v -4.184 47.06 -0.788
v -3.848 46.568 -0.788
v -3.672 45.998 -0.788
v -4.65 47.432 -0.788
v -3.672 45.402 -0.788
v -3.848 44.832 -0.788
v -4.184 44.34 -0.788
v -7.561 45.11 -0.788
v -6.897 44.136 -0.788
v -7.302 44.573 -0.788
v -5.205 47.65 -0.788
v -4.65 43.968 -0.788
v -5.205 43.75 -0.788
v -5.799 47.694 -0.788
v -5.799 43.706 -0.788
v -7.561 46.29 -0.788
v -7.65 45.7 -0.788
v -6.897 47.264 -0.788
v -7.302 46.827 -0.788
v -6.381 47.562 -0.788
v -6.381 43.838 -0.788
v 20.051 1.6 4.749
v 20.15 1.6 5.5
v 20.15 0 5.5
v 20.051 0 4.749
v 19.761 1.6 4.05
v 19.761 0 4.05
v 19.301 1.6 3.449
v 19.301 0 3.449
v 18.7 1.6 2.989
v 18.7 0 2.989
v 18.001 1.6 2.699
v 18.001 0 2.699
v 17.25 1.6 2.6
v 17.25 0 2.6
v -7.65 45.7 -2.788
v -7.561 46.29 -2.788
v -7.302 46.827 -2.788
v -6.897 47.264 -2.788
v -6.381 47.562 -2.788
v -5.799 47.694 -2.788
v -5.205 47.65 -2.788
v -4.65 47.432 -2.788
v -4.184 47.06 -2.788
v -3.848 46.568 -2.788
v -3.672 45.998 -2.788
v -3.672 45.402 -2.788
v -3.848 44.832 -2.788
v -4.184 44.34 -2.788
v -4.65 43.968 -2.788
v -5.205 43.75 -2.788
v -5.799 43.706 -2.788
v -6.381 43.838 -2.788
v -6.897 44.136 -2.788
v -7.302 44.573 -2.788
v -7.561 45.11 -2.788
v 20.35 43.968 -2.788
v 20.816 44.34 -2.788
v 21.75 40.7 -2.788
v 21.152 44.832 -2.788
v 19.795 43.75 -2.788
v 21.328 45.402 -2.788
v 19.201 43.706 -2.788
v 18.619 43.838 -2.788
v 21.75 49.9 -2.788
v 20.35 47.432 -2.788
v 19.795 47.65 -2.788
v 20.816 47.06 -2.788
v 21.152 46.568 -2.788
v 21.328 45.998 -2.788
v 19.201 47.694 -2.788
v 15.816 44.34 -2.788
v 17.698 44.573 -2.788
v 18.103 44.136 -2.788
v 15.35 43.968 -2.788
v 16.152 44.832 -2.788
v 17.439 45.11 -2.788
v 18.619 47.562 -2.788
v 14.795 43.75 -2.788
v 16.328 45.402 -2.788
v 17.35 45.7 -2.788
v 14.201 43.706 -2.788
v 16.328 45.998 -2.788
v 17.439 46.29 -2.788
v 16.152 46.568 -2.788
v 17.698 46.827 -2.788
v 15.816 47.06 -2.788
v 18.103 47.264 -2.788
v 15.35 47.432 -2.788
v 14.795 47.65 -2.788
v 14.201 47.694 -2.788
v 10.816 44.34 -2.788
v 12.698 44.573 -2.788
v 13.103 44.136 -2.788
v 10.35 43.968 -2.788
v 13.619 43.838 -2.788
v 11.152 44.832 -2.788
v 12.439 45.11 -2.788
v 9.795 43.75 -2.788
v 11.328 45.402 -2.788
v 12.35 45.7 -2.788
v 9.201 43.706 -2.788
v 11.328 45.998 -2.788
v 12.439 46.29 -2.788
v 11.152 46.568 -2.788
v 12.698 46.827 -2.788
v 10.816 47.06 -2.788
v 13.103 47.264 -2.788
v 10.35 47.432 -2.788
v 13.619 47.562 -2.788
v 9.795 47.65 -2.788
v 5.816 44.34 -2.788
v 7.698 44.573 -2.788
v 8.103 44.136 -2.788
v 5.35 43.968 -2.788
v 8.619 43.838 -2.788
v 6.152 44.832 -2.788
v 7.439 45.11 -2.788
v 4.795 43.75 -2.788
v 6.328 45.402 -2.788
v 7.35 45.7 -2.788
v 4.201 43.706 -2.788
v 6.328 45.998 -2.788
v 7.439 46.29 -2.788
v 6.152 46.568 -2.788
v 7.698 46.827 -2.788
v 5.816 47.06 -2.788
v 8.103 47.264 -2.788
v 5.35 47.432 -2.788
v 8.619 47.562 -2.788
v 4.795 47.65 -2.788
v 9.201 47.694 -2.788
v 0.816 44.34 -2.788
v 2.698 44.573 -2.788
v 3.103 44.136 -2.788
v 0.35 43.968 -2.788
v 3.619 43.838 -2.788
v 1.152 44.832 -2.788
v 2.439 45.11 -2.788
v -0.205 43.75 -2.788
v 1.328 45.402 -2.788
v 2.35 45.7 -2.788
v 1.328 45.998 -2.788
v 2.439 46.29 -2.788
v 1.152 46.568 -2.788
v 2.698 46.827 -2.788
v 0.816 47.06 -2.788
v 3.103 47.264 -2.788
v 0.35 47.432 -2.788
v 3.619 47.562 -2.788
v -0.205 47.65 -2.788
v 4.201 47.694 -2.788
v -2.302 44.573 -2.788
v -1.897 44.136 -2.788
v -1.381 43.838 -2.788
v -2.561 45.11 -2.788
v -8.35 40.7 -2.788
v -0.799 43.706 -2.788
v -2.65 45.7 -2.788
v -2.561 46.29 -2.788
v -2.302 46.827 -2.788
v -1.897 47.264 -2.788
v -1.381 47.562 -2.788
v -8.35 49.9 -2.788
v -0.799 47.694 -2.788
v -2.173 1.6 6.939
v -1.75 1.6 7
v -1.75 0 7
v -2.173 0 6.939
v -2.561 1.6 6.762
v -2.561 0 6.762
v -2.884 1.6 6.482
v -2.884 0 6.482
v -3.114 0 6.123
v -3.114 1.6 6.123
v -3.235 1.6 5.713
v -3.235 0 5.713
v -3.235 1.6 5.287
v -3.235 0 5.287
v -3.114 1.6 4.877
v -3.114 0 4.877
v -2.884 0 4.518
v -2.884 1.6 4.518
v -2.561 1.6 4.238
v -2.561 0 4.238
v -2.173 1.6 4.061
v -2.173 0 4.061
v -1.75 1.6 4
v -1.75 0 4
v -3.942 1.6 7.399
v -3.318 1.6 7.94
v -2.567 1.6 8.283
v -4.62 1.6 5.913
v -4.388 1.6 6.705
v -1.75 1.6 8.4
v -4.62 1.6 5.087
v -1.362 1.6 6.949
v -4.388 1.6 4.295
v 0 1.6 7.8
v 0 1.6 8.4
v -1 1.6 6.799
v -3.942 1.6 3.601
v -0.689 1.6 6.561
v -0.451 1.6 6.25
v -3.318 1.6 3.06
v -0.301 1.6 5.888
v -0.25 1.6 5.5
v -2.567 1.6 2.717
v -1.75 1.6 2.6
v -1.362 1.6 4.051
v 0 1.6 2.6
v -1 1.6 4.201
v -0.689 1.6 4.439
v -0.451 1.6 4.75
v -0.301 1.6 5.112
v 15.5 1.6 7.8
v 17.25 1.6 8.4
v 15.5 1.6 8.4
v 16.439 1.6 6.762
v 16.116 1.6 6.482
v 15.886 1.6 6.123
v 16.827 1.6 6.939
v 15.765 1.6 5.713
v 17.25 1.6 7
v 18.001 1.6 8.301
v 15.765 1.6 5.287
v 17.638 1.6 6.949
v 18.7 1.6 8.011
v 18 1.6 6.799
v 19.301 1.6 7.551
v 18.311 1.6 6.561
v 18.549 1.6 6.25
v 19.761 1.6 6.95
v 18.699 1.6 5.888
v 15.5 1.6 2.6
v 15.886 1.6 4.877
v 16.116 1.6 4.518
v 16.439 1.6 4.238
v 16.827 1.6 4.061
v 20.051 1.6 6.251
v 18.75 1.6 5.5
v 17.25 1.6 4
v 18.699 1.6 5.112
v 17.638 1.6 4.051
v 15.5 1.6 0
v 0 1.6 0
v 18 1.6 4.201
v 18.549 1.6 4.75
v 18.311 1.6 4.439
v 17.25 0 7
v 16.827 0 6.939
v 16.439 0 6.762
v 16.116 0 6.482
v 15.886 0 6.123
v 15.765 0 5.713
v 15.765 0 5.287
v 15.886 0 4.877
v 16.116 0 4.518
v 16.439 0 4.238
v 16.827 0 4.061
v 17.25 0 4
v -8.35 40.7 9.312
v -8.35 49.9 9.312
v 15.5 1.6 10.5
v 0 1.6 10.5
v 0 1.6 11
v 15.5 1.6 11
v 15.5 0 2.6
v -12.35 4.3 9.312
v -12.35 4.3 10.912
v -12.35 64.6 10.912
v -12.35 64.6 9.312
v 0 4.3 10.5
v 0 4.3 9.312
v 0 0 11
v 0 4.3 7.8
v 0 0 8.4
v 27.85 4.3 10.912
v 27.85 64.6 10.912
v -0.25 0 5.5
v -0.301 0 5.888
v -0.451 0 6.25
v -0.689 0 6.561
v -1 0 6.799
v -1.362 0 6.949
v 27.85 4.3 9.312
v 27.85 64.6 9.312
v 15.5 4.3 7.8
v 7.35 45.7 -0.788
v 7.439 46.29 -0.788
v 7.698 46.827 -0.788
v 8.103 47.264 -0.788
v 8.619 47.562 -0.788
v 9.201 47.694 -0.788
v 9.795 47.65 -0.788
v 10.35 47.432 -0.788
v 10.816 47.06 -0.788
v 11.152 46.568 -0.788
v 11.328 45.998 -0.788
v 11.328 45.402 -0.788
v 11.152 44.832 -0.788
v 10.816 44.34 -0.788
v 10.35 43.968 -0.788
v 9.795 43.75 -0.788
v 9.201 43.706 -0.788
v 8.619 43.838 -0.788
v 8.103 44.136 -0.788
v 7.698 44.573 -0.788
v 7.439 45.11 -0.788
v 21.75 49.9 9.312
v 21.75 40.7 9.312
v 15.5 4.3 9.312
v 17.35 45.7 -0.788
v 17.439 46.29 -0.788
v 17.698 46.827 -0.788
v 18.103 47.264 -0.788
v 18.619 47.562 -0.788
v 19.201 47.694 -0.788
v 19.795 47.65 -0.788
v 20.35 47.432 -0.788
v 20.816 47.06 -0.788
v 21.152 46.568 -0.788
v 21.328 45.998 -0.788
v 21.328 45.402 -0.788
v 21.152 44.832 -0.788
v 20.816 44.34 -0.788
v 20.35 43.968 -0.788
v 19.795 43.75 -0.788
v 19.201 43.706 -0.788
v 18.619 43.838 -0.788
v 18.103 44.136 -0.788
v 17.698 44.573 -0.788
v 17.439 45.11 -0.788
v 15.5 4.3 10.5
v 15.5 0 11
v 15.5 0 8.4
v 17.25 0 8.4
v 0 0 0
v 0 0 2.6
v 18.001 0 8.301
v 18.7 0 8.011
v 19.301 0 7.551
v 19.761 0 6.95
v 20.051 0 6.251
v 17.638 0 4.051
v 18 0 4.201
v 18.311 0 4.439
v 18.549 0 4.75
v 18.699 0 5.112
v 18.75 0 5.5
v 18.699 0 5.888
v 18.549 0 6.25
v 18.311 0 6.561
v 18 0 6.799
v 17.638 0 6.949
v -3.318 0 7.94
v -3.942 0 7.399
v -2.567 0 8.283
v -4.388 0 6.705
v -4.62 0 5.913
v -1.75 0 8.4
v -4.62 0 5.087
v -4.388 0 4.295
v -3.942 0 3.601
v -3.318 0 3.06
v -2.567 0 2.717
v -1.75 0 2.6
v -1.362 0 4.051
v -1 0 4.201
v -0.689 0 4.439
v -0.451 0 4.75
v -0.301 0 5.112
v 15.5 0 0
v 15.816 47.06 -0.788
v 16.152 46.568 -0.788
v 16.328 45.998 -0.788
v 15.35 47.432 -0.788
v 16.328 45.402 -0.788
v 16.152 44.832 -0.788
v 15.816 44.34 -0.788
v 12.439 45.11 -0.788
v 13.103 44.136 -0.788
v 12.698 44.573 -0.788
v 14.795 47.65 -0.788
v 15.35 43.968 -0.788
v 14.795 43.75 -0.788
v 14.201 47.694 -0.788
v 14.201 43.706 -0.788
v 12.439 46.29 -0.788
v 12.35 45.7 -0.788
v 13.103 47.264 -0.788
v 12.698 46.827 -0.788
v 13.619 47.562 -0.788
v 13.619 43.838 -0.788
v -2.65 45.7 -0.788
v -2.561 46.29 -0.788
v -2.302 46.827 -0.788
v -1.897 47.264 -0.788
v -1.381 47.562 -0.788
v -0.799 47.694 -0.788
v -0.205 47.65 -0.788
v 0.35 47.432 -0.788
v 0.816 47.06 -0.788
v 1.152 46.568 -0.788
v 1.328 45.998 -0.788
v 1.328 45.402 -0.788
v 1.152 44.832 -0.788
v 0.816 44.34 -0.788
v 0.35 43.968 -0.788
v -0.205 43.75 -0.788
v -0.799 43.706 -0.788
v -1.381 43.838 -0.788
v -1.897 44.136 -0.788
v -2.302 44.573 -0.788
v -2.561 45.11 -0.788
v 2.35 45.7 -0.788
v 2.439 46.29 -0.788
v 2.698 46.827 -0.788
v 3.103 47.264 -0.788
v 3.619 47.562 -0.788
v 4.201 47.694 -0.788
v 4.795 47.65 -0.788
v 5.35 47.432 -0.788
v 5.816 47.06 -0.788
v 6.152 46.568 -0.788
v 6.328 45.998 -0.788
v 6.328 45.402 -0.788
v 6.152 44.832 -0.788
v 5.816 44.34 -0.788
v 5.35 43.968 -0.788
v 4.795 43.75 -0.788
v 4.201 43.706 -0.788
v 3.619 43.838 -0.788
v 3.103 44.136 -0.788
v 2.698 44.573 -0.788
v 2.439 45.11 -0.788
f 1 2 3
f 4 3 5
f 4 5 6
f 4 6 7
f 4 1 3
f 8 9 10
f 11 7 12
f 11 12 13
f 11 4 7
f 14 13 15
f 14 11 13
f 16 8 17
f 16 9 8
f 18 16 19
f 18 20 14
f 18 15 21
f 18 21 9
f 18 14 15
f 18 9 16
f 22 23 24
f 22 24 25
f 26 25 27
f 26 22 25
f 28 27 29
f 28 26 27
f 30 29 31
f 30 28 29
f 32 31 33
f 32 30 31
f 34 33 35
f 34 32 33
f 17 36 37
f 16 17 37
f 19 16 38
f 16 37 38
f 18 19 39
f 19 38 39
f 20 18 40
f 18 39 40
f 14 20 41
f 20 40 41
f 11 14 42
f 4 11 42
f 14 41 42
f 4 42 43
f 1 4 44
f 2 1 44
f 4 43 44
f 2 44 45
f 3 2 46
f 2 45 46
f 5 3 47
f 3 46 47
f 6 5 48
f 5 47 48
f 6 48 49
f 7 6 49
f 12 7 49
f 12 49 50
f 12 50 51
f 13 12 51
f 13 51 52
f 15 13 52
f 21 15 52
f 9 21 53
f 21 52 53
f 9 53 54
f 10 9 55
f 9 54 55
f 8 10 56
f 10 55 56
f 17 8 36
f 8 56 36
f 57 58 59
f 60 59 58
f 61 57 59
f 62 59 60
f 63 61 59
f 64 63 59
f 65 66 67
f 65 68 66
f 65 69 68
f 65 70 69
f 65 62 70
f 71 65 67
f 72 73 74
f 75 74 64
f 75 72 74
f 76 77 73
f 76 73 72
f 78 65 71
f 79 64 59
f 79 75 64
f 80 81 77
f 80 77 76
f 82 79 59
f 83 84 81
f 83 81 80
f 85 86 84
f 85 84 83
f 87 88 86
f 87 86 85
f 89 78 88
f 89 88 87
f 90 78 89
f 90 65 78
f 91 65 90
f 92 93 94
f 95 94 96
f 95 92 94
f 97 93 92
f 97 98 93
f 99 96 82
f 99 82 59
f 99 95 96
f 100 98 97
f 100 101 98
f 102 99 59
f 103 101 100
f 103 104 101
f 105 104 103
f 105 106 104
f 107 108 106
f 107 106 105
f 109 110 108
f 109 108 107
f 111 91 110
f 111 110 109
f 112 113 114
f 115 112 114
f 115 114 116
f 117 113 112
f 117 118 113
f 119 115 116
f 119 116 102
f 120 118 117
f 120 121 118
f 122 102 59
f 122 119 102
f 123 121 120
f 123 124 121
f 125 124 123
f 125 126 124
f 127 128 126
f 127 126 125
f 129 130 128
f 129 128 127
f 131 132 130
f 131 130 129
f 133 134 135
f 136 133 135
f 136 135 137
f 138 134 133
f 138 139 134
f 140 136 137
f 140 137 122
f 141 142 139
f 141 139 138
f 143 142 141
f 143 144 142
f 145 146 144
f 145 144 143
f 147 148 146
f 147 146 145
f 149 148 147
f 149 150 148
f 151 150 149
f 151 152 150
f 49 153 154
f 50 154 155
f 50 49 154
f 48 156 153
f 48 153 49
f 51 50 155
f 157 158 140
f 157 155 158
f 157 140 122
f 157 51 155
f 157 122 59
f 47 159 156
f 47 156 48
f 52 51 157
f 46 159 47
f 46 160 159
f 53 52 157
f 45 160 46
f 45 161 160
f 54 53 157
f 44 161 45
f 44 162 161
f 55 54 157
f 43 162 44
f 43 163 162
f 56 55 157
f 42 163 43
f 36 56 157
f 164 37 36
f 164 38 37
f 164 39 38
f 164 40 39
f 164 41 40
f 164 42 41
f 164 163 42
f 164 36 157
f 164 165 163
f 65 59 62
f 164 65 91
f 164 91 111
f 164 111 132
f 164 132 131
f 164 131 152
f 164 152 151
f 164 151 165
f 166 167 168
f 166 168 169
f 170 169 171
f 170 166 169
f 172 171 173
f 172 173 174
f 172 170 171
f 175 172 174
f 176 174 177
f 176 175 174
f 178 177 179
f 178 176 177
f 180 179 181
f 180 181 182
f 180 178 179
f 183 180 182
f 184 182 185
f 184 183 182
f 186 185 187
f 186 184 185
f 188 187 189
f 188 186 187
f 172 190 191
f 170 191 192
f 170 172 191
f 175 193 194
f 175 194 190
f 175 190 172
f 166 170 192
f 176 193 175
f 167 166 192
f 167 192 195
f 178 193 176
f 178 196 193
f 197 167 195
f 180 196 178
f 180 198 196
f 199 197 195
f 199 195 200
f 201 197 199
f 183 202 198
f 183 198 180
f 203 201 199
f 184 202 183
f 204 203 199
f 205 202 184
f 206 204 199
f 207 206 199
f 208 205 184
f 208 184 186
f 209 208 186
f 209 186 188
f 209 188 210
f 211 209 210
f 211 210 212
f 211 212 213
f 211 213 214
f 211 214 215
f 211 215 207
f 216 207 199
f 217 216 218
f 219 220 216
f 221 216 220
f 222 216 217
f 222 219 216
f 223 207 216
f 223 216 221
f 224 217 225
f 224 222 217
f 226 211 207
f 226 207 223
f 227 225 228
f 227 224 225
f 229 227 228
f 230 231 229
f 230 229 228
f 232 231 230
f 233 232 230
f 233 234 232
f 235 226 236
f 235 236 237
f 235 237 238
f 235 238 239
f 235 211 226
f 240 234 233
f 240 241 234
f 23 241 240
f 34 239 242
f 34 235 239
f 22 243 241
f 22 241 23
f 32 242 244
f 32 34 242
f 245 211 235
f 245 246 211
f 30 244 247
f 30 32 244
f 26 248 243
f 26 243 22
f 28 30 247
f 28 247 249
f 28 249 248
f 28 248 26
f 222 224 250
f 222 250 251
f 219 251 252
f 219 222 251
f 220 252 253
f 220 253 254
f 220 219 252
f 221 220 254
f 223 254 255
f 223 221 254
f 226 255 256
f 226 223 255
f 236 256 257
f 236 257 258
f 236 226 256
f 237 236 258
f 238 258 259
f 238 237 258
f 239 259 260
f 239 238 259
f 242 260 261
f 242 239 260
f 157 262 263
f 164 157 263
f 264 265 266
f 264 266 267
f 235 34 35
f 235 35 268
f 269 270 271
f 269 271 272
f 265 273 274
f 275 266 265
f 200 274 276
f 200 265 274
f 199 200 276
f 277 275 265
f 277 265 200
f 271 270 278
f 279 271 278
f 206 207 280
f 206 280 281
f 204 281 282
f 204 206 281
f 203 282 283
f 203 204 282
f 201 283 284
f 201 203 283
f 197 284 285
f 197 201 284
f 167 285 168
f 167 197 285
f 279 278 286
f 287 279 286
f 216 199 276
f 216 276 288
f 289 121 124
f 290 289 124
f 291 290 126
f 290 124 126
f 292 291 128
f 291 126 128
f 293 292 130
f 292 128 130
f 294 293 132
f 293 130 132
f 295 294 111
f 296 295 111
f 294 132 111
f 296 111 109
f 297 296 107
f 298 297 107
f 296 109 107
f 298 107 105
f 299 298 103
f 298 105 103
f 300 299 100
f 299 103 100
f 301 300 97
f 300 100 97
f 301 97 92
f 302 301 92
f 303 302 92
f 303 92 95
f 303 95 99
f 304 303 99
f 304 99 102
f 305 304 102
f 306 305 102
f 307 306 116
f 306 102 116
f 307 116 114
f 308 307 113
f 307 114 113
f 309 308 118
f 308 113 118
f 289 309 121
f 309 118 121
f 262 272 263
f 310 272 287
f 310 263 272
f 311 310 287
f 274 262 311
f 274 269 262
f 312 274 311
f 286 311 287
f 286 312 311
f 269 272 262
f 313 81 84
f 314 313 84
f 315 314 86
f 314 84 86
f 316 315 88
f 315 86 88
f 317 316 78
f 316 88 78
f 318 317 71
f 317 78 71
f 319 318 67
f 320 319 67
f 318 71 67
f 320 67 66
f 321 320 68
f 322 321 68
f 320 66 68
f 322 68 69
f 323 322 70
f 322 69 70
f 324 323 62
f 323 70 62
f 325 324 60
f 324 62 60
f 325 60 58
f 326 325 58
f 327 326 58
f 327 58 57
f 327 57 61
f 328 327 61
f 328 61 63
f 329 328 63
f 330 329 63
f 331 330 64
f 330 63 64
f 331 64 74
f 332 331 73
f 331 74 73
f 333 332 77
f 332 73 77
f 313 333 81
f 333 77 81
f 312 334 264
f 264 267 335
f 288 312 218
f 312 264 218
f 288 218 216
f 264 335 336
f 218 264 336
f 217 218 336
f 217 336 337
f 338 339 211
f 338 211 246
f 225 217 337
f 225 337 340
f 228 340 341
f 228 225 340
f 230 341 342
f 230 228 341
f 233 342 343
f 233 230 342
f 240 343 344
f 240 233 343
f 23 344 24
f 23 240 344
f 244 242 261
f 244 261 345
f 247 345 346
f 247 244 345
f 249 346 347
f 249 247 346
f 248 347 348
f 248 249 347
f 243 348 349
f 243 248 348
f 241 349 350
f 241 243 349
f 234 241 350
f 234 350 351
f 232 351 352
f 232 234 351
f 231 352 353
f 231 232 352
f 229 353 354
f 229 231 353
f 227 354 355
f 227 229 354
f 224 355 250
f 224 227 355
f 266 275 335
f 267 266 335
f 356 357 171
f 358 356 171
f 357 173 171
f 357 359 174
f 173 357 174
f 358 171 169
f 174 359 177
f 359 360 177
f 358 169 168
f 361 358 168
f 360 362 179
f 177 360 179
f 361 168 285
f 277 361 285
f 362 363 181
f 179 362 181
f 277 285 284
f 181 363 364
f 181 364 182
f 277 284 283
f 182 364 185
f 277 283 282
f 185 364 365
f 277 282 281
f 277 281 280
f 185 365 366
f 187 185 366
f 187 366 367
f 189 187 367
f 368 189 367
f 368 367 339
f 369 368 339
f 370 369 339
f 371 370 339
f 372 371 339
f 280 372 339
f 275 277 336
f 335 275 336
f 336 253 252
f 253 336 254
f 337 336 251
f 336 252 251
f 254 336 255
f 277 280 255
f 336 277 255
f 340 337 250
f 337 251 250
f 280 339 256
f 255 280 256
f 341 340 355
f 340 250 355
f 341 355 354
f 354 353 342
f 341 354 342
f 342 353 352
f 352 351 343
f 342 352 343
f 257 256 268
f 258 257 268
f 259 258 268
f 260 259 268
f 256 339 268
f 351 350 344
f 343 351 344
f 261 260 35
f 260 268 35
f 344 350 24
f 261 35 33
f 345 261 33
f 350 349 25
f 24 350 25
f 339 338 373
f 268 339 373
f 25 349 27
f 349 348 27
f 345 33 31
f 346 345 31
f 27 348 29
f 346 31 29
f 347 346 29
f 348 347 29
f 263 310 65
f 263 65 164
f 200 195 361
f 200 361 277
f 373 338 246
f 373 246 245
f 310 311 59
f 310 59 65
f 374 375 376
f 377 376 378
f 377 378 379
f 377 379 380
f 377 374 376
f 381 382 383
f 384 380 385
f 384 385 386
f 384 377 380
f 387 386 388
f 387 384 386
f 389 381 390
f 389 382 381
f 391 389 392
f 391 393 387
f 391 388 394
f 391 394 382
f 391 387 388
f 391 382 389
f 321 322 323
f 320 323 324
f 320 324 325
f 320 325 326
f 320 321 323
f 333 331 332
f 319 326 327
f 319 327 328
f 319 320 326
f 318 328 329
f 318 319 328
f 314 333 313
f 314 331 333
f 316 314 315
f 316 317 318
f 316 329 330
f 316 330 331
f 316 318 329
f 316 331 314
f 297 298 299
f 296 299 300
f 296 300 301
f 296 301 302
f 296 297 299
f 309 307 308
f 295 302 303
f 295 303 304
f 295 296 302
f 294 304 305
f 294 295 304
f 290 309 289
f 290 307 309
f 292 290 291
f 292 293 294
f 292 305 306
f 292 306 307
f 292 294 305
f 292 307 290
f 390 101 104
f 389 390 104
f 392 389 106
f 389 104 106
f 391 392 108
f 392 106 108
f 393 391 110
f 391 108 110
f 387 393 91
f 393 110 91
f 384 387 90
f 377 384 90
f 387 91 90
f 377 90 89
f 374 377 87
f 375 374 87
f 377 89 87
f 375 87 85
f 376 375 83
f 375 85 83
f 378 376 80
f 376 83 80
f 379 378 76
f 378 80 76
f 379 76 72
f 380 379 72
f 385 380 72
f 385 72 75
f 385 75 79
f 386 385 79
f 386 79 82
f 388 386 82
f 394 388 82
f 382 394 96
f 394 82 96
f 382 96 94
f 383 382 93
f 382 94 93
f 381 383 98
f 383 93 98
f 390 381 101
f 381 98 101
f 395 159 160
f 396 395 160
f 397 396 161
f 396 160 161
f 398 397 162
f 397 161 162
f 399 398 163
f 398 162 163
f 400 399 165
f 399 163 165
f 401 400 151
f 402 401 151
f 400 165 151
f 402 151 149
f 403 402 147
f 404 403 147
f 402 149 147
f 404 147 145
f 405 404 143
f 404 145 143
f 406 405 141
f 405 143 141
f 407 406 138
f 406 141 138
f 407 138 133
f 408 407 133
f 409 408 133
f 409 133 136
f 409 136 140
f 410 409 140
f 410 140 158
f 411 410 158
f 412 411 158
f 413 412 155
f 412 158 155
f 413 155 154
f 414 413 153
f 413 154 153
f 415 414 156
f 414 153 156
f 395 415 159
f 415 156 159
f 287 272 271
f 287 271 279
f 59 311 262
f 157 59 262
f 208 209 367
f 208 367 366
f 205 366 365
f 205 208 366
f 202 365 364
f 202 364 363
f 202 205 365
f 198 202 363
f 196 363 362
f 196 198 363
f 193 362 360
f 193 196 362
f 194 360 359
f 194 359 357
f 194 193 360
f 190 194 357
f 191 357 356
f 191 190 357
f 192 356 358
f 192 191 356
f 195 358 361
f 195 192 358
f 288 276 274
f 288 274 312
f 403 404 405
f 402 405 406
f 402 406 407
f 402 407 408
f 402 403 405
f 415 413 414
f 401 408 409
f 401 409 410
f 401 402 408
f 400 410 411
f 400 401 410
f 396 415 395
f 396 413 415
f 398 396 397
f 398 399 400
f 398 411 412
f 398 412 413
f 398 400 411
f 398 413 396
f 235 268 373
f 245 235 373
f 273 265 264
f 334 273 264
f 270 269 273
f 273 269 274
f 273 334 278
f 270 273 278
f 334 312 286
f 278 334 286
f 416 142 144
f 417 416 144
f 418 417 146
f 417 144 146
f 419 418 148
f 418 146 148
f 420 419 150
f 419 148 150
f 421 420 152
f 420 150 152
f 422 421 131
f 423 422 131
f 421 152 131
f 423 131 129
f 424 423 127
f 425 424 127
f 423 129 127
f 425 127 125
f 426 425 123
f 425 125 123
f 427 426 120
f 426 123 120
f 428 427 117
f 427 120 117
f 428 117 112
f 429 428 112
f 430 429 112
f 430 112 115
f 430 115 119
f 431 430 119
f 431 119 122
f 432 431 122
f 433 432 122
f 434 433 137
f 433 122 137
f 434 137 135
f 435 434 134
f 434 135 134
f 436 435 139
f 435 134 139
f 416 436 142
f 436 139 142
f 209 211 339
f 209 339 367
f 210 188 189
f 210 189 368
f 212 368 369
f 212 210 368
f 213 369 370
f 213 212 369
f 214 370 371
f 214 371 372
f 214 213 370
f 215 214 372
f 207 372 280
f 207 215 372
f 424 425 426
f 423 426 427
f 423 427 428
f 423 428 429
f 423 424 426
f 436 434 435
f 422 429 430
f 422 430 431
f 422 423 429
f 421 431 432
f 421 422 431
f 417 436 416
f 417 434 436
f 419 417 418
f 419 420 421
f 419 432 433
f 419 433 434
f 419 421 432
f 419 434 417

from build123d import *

# Parameters (mm, degrees)
SKETCH1_W           = 15.5
SKETCH1_H           = 11
BOSS_EXTRUDE1_DEPTH = 1.6
BOSS_EXTRUDE2_DEPTH = 1.6
SKETCH3_W           = 15.5
SKETCH3_H           = 2.7
BOSS_EXTRUDE3_DEPTH = 2.7
SKETCH4_W           = 40.2
SKETCH4_H           = 1.6
BOSS_EXTRUDE4_DEPTH = 60.3
SKETCH5_W           = 30.1
SKETCH5_H           = 9.2
BOSS_EXTRUDE5_DEPTH = 12.1
SKETCH6_R           = 2
CUT_EXTRUDE1_DEPTH  = 2
LPATTERN1_COUNT     = 6
LPATTERN1_PITCH     = 5


with BuildPart() as part:
    # Sketch1 → Boss-Extrude1 (new body)
    with BuildSketch(Plane(origin=(0, 0, 0), x_dir=(1, 0, 0), z_dir=(0, 1, 0))):
        with Locations((7.75, -5.5)):
            Rectangle(SKETCH1_W, SKETCH1_H)
    extrude(amount=BOSS_EXTRUDE1_DEPTH)

    # Sketch2 → Boss-Extrude2 (add, through all)
    with BuildSketch(Plane(origin=(0, 1.6, 0), x_dir=(1, 0, 0), z_dir=(0, 1, 0))):
        with BuildLine():
            Line((-1.75, -4), (-1.75, -2.6))
            ThreePointArc((-1.75, -2.6), (-4.65, -5.5), (-1.75, -8.4))
            Line((-1.75, -8.4), (-1.75, -7))
            ThreePointArc((-1.75, -7), (-3.25, -5.5), (-1.75, -4))
        make_face()
        with BuildLine():
            ThreePointArc((0, -3.187533784), (-0.827002716, -2.750804479), (-1.75, -2.6))
            Line((-1.75, -2.6), (-1.75, -4))
            ThreePointArc((-1.75, -4), (-0.689339828, -4.439339828), (-0.25, -5.5))
            ThreePointArc((-0.25, -5.5), (-0.689339828, -6.560660172), (-1.75, -7))
            Line((-1.75, -7), (-1.75, -8.4))
            ThreePointArc((-1.75, -8.4), (-0.827002716, -8.249195521), (0, -7.812466216))
            Line((0, -7.812466216), (0, -3.187533784))
        make_face()
        with BuildLine():
            Line((0, -2.6), (-1.75, -2.6))
            ThreePointArc((-1.75, -2.6), (-0.827002716, -2.750804479), (0, -3.187533784))
            Line((0, -3.187533784), (0, -2.6))
        make_face()
        with BuildLine():
            ThreePointArc((0, -7.812466216), (-0.827002716, -8.249195521), (-1.75, -8.4))
            Line((-1.75, -8.4), (0, -8.4))
            Line((0, -8.4), (0, -7.812466216))
        make_face()
        with BuildLine():
            ThreePointArc((20.15, -5.5), (19.300609665, -3.449390335), (17.25, -2.6))
            Line((17.25, -2.6), (17.25, -4))
            ThreePointArc((17.25, -4), (18.310660172, -4.439339828), (18.75, -5.5))
            ThreePointArc((18.75, -5.5), (18.310660172, -6.560660172), (17.25, -7))
            Line((17.25, -7), (17.25, -8.4))
            ThreePointArc((17.25, -8.4), (19.300609665, -7.550609665), (20.15, -5.5))
        make_face()
        with BuildLine():
            Line((17.25, -4), (17.25, -2.6))
            ThreePointArc((17.25, -2.6), (16.327002716, -2.750804479), (15.5, -3.187533784))
            Line((15.5, -3.187533784), (15.5, -7.812466216))
            ThreePointArc((15.5, -7.812466216), (16.327002716, -8.249195521), (17.25, -8.4))
            Line((17.25, -8.4), (17.25, -7))
            ThreePointArc((17.25, -7), (15.75, -5.5), (17.25, -4))
        make_face()
        with BuildLine():
            Line((17.25, -2.6), (15.5, -2.6))
            Line((15.5, -2.6), (15.5, -3.187533784))
            ThreePointArc((15.5, -3.187533784), (16.327002716, -2.750804479), (17.25, -2.6))
        make_face()
        with BuildLine():
            Line((15.5, -7.812466216), (15.5, -8.4))
            Line((15.5, -8.4), (17.25, -8.4))
            ThreePointArc((17.25, -8.4), (16.327002716, -8.249195521), (15.5, -7.812466216))
        make_face()
    extrude(amount=-BOSS_EXTRUDE2_DEPTH)

    # Sketch3 → Boss-Extrude3 (add)
    with BuildSketch(Plane(origin=(0, 1.6, 0), x_dir=(1, 0, 0), z_dir=(0, 1, 0))):
        with Locations((7.75, -9.15)):
            Rectangle(SKETCH3_W, SKETCH3_H)
    extrude(amount=BOSS_EXTRUDE3_DEPTH)

    # Sketch4 → Boss-Extrude4 (add)
    with BuildSketch(Plane(origin=(0, 4.3, 0), x_dir=(1, 0, 0), z_dir=(0, 1, 0))):
        with Locations((7.75, -10.112281479)):
            Rectangle(SKETCH4_W, SKETCH4_H)
    extrude(amount=BOSS_EXTRUDE4_DEPTH)

    # Sketch5 → Boss-Extrude5 (add)
    with BuildSketch(Plane(origin=(0, 0, 9.312281479), x_dir=(-1, 0, 0), z_dir=(0, 0, -1))):
        with Locations((-6.7, 45.3)):
            Rectangle(SKETCH5_W, SKETCH5_H)
    extrude(amount=BOSS_EXTRUDE5_DEPTH)

    # Sketch6 → Cut-Extrude1 (cut)
    with BuildSketch(Plane(origin=(0, 0, -2.787718521), x_dir=(-1, 0, 0), z_dir=(0, 0, -1))):
        with Locations((-19.35, 45.7)):
            Circle(SKETCH6_R)
    cut_extrude1 = extrude(amount=-CUT_EXTRUDE1_DEPTH, mode=Mode.SUBTRACT)

    # LPattern1: Cut-Extrude1 ×6
    with Locations(*[(-i * LPATTERN1_PITCH, 0, 0) for i in range(1, LPATTERN1_COUNT)]):
        add(cut_extrude1, mode=Mode.SUBTRACT)


solid = part.part
